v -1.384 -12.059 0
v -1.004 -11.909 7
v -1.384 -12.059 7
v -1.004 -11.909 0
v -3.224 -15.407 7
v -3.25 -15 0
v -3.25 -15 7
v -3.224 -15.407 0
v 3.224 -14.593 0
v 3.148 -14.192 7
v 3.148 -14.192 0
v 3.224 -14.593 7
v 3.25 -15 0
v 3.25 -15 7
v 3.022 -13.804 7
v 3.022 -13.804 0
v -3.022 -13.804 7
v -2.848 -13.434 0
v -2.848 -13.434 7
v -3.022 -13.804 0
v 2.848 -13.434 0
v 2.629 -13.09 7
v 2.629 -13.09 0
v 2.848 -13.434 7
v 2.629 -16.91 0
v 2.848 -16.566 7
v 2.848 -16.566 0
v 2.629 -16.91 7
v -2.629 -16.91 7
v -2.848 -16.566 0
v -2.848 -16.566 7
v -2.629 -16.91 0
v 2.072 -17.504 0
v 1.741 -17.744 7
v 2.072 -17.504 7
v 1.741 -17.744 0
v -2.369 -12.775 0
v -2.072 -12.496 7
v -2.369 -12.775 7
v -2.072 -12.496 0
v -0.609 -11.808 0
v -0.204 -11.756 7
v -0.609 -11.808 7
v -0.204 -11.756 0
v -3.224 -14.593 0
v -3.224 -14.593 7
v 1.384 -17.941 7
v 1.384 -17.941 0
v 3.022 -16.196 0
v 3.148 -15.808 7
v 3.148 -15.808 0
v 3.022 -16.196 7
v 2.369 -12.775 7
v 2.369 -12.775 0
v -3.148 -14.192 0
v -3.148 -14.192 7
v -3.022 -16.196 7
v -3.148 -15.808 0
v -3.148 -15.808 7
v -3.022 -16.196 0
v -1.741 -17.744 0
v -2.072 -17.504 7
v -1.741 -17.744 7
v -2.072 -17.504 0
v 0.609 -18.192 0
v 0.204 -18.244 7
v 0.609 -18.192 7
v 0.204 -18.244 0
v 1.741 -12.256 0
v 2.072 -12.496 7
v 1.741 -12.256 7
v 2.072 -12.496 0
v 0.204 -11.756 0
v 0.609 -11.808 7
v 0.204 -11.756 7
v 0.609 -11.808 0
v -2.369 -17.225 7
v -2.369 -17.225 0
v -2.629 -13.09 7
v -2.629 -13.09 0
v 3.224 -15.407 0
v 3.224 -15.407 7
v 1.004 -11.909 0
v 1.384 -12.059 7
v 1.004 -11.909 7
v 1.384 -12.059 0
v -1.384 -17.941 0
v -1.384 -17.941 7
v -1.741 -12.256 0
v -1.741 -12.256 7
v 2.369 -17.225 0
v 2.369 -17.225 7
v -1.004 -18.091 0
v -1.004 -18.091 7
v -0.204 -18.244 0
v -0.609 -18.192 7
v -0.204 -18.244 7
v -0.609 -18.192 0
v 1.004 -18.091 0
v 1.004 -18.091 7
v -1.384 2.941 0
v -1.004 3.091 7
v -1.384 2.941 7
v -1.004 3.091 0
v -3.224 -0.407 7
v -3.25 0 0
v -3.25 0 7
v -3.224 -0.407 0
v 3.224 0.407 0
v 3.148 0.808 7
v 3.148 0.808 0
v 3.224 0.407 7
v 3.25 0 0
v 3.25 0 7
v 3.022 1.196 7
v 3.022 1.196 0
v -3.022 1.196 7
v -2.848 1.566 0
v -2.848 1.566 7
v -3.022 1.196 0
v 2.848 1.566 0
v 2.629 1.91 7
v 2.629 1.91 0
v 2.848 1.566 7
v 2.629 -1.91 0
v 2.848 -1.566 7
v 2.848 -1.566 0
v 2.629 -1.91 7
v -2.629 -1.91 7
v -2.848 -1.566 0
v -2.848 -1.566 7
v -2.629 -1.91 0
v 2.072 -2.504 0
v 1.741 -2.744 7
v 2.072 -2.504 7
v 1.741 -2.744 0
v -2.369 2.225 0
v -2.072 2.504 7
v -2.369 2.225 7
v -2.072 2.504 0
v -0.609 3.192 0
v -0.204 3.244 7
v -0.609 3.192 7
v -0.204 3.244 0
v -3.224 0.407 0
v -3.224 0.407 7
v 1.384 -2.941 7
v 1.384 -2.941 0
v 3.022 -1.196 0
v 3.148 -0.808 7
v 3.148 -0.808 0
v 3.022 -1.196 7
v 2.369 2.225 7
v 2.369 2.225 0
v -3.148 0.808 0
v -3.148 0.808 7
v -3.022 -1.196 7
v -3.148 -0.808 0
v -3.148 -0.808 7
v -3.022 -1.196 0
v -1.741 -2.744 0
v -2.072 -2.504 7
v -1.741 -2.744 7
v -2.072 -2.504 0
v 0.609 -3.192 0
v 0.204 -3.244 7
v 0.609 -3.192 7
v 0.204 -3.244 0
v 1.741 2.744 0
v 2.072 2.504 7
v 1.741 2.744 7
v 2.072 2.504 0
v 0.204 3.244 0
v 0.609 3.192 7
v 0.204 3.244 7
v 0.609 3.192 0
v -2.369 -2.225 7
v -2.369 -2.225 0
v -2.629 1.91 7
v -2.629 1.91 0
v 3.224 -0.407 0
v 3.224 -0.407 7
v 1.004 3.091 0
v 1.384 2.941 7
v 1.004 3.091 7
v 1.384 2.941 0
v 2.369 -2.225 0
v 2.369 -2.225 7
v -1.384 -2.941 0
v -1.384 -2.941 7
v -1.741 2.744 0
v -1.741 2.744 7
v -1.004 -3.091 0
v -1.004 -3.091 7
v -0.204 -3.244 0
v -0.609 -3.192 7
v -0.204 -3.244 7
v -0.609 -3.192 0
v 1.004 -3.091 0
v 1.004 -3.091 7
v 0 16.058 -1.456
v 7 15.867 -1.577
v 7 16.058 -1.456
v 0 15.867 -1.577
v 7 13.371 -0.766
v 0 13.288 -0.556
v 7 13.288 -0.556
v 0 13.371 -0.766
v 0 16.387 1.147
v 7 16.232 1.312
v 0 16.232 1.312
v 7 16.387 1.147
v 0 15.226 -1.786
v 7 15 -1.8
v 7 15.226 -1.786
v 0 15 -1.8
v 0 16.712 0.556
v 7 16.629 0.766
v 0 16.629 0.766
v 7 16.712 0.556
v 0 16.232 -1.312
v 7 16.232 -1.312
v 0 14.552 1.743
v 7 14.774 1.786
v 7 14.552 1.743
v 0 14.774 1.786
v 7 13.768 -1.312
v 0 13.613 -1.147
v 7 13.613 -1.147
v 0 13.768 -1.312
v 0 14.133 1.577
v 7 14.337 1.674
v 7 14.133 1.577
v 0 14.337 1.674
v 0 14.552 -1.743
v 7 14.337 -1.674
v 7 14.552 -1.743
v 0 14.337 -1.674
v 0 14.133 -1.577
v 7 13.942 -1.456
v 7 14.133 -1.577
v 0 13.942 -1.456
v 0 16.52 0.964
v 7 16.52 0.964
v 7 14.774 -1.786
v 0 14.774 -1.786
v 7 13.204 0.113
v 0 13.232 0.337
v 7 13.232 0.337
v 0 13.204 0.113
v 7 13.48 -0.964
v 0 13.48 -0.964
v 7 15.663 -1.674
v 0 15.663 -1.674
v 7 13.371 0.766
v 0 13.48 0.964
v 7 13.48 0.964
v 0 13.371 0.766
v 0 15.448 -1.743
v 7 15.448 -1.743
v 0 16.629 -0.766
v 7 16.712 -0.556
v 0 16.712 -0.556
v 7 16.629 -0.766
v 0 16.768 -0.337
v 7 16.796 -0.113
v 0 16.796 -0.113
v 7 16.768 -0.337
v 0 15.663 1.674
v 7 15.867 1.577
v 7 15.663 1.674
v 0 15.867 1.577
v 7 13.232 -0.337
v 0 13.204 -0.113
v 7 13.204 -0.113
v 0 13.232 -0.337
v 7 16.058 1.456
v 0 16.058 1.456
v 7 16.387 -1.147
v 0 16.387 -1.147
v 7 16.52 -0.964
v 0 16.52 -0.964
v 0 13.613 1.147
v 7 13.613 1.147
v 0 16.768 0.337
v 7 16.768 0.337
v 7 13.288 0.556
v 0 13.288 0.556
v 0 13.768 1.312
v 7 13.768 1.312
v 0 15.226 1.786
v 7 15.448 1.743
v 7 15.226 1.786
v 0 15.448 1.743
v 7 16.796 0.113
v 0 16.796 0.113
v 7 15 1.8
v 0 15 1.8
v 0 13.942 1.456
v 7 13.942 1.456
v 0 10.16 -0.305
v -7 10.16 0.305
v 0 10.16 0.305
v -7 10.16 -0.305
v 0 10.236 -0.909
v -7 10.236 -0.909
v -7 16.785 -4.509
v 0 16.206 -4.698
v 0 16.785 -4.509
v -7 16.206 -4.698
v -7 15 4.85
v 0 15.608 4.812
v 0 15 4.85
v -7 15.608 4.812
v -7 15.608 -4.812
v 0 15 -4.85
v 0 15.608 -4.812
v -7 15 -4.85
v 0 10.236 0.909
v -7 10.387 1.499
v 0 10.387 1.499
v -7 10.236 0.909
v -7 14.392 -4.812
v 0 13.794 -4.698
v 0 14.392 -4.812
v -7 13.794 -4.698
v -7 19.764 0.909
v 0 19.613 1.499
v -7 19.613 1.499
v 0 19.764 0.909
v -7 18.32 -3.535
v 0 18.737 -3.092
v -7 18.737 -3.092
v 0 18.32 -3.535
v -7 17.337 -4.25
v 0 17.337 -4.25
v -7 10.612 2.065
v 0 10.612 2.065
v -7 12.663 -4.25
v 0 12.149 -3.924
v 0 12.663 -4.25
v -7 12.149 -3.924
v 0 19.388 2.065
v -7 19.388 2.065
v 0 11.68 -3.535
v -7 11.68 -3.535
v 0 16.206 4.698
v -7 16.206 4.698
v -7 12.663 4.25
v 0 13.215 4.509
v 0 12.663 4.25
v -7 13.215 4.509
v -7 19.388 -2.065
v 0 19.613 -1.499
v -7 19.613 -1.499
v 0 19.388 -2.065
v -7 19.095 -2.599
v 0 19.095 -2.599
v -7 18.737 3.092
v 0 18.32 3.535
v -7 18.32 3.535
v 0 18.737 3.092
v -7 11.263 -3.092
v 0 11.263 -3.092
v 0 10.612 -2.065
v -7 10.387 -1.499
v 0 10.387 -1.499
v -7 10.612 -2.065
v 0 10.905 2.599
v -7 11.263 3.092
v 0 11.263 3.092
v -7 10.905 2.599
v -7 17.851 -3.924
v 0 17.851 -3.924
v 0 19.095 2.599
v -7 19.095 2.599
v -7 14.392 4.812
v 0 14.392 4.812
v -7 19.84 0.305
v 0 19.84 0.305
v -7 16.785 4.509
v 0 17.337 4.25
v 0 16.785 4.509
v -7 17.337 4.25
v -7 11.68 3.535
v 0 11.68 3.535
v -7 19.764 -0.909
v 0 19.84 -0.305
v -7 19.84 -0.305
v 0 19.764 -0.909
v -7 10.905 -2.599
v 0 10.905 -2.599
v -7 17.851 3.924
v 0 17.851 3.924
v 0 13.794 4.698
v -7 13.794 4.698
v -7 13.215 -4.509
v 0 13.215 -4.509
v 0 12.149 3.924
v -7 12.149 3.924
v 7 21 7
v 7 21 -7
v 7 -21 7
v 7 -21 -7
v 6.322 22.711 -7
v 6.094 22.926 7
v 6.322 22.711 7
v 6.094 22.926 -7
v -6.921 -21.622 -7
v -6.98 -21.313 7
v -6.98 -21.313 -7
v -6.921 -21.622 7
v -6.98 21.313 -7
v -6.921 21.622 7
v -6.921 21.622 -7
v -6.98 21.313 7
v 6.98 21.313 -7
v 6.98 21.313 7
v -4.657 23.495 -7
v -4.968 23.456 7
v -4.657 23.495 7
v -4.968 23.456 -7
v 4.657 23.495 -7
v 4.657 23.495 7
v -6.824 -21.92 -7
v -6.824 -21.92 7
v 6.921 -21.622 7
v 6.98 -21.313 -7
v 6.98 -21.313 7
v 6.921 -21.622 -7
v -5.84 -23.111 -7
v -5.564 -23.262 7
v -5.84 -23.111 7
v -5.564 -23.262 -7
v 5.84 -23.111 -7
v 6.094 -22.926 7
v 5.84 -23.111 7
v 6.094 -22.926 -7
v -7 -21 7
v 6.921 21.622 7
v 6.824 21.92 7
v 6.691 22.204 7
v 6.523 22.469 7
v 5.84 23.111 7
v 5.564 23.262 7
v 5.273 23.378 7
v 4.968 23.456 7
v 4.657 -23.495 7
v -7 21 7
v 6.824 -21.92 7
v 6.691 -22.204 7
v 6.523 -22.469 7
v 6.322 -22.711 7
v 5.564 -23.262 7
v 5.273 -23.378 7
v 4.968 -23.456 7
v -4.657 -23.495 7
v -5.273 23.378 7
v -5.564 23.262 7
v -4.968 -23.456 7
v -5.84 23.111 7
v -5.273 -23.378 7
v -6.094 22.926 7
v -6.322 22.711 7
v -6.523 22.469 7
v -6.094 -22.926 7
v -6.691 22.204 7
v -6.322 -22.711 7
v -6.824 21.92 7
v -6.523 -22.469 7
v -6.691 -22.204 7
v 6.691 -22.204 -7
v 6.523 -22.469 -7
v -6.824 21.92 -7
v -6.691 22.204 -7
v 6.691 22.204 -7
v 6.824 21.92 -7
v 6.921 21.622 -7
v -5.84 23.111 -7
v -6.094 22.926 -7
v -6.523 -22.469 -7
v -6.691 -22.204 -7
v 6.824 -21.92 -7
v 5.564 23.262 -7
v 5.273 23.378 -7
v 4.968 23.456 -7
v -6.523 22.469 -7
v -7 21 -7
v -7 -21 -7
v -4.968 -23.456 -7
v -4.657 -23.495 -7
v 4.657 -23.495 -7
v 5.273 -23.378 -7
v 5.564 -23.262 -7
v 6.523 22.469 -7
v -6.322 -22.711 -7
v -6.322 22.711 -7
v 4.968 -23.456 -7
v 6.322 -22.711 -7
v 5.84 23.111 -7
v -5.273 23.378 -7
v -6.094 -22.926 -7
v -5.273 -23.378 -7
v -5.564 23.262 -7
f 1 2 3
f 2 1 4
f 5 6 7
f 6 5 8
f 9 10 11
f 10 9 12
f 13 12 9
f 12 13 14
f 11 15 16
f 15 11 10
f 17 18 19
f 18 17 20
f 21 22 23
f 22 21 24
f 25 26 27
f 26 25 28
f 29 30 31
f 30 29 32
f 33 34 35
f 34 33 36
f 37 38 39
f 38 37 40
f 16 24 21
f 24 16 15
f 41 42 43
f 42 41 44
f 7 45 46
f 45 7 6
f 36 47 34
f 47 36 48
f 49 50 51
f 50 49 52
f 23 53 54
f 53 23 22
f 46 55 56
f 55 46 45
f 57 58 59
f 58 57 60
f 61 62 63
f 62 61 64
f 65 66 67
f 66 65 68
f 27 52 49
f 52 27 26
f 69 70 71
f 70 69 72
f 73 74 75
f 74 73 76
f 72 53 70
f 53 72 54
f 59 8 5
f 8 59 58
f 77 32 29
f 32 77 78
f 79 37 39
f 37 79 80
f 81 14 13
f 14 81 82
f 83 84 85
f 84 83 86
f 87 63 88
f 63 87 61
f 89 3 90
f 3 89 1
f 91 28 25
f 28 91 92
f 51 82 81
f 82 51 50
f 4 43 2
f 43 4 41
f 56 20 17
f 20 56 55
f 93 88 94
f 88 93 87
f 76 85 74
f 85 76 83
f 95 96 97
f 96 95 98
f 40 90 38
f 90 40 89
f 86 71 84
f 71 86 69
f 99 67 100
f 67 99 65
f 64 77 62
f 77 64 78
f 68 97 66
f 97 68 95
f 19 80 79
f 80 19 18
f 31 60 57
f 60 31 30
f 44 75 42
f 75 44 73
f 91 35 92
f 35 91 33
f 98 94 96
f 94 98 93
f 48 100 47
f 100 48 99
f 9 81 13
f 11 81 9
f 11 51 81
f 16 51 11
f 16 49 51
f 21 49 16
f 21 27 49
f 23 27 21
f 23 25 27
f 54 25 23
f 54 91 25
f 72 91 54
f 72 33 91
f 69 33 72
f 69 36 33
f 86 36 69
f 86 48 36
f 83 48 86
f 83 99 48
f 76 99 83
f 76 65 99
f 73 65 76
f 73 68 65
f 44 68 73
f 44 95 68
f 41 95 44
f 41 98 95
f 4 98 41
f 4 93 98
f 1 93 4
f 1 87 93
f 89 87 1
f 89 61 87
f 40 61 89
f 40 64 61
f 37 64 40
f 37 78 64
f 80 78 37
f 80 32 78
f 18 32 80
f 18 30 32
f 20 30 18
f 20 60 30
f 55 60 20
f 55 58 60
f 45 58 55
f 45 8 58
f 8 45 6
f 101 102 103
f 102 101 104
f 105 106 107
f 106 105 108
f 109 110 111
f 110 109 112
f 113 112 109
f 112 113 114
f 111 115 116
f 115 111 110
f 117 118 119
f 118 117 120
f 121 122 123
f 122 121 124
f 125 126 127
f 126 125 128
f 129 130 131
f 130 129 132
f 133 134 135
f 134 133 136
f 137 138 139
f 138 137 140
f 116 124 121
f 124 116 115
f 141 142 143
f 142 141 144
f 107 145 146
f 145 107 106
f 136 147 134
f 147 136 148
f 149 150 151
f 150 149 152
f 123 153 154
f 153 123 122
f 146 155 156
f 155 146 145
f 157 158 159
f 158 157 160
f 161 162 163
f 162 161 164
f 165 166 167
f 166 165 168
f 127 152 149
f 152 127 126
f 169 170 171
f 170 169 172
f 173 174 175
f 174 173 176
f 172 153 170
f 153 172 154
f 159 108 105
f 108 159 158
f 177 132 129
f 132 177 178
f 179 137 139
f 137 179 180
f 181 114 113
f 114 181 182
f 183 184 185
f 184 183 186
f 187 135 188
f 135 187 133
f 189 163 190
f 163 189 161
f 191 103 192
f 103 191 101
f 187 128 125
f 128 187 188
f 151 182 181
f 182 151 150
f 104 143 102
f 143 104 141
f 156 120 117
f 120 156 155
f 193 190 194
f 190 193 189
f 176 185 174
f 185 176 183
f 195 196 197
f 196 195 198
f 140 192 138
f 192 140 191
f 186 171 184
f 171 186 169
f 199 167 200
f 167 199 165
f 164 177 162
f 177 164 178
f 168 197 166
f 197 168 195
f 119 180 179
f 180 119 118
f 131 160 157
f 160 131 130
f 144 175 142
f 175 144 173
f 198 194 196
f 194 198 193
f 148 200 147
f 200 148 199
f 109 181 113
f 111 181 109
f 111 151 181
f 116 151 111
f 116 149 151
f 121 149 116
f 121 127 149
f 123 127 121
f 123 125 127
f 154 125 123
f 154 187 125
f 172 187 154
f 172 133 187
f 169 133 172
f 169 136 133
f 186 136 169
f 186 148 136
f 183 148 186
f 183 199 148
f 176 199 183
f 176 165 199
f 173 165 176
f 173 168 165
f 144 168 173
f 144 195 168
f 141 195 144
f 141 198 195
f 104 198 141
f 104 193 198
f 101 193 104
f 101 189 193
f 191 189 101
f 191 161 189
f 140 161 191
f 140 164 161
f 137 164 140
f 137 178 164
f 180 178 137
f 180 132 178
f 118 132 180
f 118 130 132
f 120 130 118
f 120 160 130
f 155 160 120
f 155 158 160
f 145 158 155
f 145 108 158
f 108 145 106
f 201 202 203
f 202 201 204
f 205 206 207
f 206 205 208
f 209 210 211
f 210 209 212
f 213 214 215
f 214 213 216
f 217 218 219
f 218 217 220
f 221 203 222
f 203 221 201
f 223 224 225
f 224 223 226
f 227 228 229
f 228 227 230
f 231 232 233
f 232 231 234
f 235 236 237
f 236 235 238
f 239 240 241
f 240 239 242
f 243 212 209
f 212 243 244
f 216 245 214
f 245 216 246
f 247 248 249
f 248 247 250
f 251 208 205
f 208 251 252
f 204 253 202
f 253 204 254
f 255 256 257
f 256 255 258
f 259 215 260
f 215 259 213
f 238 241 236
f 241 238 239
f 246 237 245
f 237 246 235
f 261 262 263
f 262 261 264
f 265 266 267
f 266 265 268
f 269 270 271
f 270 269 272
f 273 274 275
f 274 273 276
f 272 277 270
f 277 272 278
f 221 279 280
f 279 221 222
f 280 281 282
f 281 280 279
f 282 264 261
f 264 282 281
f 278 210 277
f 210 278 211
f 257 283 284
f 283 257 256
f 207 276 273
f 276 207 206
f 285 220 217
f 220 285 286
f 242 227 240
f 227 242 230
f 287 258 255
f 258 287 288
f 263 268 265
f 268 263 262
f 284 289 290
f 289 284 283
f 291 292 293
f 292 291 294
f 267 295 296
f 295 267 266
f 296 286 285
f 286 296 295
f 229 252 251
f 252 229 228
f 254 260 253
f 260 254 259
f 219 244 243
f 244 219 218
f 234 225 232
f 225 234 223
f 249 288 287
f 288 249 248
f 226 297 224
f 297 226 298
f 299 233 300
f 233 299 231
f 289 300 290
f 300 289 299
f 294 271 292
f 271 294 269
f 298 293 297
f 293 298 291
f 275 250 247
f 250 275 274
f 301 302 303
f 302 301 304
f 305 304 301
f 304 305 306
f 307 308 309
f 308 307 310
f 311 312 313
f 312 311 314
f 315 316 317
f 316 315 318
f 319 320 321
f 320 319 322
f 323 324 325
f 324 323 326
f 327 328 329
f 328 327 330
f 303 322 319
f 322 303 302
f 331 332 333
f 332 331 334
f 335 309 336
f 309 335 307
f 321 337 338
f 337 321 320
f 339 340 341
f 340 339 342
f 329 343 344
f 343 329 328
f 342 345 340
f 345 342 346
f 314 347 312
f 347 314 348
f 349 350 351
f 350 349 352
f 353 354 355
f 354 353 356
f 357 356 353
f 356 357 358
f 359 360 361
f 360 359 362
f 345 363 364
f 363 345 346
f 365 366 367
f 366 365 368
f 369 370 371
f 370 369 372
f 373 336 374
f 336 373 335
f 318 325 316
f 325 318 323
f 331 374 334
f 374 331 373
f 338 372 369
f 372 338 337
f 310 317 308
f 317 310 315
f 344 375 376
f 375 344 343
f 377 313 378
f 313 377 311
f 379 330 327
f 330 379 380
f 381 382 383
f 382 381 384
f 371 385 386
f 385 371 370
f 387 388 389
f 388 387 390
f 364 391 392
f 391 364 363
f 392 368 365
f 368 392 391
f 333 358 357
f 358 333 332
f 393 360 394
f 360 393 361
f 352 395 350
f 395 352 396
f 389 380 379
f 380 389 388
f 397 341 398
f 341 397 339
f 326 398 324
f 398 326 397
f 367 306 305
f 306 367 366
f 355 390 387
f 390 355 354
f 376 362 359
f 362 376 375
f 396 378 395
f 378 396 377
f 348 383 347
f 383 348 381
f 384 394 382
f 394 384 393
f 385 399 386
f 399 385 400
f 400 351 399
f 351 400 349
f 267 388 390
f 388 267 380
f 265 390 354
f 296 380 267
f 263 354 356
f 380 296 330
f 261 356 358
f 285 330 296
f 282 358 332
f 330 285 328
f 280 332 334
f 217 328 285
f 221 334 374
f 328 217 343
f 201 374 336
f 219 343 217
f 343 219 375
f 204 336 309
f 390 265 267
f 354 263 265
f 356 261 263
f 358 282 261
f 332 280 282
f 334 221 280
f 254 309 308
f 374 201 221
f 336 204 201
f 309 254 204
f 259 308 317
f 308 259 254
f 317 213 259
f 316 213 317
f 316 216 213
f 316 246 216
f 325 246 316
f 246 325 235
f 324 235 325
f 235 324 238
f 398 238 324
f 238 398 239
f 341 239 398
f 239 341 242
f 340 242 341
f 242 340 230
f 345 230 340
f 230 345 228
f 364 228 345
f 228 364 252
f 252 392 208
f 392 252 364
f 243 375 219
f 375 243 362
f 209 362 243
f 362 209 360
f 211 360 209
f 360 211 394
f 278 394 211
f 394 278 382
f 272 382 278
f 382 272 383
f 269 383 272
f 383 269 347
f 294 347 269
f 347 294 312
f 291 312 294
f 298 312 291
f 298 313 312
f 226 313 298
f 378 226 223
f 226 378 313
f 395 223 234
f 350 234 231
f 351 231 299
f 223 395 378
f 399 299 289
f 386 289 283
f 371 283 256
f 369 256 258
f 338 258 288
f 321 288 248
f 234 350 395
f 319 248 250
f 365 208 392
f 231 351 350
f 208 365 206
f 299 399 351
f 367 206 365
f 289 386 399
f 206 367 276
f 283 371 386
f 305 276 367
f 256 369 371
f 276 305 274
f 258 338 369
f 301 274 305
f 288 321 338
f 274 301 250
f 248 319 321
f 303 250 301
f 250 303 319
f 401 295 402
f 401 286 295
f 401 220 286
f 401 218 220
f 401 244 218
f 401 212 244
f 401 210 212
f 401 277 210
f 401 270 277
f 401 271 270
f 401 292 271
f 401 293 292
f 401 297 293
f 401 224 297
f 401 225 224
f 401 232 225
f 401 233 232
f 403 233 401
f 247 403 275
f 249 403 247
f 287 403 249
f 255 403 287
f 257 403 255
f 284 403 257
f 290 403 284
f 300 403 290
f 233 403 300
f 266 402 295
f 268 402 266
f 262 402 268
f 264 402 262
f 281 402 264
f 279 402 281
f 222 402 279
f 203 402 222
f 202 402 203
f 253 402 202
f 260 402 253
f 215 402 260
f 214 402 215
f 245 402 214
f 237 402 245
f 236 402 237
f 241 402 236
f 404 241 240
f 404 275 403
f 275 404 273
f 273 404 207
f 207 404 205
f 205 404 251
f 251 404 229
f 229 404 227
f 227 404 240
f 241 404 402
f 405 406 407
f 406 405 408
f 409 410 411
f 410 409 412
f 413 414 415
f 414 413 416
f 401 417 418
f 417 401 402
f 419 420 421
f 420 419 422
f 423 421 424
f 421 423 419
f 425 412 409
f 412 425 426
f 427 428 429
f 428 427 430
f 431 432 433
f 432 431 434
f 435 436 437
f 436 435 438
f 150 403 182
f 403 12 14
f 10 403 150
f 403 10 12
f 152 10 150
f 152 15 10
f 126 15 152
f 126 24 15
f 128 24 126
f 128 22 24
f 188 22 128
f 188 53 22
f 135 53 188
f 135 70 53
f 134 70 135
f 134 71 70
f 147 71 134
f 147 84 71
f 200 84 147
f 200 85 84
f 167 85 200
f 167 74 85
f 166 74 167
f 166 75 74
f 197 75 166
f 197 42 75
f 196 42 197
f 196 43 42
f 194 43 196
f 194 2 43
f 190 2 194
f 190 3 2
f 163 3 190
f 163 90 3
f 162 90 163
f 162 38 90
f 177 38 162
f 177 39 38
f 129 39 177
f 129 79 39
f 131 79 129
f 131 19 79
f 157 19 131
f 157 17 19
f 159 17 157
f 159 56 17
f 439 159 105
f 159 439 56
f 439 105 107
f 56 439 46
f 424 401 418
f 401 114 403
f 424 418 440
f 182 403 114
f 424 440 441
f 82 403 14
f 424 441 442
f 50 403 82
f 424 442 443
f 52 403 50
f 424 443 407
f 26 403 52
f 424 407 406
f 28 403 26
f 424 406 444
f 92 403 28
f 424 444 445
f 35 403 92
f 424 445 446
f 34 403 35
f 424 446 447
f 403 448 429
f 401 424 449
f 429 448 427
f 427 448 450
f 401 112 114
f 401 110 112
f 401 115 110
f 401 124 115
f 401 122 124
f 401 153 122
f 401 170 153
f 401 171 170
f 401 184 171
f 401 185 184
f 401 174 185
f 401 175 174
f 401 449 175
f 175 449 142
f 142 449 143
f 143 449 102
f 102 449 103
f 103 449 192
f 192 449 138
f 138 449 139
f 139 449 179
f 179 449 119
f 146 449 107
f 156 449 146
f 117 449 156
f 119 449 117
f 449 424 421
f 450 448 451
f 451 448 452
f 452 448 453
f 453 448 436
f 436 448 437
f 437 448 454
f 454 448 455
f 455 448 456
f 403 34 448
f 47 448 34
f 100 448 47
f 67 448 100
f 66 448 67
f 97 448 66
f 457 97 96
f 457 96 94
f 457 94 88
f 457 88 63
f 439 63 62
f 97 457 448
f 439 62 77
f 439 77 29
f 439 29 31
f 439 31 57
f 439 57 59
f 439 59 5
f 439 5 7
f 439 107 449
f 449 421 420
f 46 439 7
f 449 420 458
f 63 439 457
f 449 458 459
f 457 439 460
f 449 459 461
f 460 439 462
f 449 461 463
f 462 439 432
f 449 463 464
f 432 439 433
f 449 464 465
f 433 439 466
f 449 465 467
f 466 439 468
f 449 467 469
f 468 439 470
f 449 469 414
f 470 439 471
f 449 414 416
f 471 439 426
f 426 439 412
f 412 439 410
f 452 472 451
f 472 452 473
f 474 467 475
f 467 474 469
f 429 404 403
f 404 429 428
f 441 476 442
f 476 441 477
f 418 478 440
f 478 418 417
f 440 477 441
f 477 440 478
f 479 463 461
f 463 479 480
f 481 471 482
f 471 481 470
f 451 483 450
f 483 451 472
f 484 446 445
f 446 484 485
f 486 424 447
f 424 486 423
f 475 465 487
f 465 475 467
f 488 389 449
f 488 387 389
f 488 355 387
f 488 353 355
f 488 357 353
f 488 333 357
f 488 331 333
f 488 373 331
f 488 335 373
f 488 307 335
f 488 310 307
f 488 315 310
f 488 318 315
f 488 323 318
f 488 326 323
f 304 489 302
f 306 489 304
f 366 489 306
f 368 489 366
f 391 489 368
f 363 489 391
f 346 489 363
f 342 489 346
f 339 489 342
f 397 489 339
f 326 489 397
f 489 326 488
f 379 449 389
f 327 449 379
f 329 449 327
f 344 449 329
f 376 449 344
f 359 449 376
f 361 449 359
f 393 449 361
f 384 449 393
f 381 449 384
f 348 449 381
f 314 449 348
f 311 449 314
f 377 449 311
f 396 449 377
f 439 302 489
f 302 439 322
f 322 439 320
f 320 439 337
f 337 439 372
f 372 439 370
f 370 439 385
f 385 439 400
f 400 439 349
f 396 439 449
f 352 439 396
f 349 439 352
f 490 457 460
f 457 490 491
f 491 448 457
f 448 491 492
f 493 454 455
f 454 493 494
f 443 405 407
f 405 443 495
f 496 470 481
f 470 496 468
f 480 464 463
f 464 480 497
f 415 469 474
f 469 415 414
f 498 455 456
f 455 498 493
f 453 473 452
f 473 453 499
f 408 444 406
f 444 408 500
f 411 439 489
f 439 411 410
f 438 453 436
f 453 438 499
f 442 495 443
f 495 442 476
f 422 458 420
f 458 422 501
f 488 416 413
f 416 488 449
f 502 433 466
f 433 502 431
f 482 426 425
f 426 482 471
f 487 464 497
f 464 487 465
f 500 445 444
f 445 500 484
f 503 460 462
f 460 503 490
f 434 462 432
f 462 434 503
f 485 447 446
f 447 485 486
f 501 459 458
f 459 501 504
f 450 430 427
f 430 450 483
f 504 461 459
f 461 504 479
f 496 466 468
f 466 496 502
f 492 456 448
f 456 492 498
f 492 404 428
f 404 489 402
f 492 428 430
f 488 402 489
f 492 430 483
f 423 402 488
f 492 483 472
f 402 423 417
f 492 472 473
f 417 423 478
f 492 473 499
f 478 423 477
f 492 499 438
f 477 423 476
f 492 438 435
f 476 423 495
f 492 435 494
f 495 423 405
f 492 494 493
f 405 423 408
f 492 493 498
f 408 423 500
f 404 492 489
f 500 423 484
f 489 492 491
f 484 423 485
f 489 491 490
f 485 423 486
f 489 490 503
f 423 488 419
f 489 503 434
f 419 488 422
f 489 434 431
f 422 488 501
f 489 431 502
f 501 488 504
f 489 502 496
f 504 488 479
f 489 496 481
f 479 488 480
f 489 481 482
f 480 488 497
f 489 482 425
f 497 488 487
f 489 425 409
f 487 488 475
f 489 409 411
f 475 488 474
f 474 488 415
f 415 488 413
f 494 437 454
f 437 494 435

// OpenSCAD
$fn = 50;


difference() {
	union() {
		translate(v = [0, 0, -7.0000000000]) {
			hull() {
				translate(v = [-4.5000000000, 21.0000000000, 0]) {
					cylinder(h = 14, r = 2.5000000000);
				}
				translate(v = [4.5000000000, 21.0000000000, 0]) {
					cylinder(h = 14, r = 2.5000000000);
				}
				translate(v = [-4.5000000000, -21.0000000000, 0]) {
					cylinder(h = 14, r = 2.5000000000);
				}
				translate(v = [4.5000000000, -21.0000000000, 0]) {
					cylinder(h = 14, r = 2.5000000000);
				}
			}
		}
	}
	union() {
		translate(v = [0.0000000000, -15.0000000000, 0]) {
			cylinder(h = 100, r = 3.2500000000);
		}
		cylinder(h = 100, r = 3.2500000000);
		translate(v = [-50, 15, 0]) {
			rotate(a = [0, 90, 0]) {
				cylinder(h = 100, r = 1.8000000000);
			}
		}
		translate(v = [-100, 15, 0]) {
			rotate(a = [0, 90, 0]) {
				cylinder(h = 100, r = 4.8500000000);
			}
		}
	}
}
